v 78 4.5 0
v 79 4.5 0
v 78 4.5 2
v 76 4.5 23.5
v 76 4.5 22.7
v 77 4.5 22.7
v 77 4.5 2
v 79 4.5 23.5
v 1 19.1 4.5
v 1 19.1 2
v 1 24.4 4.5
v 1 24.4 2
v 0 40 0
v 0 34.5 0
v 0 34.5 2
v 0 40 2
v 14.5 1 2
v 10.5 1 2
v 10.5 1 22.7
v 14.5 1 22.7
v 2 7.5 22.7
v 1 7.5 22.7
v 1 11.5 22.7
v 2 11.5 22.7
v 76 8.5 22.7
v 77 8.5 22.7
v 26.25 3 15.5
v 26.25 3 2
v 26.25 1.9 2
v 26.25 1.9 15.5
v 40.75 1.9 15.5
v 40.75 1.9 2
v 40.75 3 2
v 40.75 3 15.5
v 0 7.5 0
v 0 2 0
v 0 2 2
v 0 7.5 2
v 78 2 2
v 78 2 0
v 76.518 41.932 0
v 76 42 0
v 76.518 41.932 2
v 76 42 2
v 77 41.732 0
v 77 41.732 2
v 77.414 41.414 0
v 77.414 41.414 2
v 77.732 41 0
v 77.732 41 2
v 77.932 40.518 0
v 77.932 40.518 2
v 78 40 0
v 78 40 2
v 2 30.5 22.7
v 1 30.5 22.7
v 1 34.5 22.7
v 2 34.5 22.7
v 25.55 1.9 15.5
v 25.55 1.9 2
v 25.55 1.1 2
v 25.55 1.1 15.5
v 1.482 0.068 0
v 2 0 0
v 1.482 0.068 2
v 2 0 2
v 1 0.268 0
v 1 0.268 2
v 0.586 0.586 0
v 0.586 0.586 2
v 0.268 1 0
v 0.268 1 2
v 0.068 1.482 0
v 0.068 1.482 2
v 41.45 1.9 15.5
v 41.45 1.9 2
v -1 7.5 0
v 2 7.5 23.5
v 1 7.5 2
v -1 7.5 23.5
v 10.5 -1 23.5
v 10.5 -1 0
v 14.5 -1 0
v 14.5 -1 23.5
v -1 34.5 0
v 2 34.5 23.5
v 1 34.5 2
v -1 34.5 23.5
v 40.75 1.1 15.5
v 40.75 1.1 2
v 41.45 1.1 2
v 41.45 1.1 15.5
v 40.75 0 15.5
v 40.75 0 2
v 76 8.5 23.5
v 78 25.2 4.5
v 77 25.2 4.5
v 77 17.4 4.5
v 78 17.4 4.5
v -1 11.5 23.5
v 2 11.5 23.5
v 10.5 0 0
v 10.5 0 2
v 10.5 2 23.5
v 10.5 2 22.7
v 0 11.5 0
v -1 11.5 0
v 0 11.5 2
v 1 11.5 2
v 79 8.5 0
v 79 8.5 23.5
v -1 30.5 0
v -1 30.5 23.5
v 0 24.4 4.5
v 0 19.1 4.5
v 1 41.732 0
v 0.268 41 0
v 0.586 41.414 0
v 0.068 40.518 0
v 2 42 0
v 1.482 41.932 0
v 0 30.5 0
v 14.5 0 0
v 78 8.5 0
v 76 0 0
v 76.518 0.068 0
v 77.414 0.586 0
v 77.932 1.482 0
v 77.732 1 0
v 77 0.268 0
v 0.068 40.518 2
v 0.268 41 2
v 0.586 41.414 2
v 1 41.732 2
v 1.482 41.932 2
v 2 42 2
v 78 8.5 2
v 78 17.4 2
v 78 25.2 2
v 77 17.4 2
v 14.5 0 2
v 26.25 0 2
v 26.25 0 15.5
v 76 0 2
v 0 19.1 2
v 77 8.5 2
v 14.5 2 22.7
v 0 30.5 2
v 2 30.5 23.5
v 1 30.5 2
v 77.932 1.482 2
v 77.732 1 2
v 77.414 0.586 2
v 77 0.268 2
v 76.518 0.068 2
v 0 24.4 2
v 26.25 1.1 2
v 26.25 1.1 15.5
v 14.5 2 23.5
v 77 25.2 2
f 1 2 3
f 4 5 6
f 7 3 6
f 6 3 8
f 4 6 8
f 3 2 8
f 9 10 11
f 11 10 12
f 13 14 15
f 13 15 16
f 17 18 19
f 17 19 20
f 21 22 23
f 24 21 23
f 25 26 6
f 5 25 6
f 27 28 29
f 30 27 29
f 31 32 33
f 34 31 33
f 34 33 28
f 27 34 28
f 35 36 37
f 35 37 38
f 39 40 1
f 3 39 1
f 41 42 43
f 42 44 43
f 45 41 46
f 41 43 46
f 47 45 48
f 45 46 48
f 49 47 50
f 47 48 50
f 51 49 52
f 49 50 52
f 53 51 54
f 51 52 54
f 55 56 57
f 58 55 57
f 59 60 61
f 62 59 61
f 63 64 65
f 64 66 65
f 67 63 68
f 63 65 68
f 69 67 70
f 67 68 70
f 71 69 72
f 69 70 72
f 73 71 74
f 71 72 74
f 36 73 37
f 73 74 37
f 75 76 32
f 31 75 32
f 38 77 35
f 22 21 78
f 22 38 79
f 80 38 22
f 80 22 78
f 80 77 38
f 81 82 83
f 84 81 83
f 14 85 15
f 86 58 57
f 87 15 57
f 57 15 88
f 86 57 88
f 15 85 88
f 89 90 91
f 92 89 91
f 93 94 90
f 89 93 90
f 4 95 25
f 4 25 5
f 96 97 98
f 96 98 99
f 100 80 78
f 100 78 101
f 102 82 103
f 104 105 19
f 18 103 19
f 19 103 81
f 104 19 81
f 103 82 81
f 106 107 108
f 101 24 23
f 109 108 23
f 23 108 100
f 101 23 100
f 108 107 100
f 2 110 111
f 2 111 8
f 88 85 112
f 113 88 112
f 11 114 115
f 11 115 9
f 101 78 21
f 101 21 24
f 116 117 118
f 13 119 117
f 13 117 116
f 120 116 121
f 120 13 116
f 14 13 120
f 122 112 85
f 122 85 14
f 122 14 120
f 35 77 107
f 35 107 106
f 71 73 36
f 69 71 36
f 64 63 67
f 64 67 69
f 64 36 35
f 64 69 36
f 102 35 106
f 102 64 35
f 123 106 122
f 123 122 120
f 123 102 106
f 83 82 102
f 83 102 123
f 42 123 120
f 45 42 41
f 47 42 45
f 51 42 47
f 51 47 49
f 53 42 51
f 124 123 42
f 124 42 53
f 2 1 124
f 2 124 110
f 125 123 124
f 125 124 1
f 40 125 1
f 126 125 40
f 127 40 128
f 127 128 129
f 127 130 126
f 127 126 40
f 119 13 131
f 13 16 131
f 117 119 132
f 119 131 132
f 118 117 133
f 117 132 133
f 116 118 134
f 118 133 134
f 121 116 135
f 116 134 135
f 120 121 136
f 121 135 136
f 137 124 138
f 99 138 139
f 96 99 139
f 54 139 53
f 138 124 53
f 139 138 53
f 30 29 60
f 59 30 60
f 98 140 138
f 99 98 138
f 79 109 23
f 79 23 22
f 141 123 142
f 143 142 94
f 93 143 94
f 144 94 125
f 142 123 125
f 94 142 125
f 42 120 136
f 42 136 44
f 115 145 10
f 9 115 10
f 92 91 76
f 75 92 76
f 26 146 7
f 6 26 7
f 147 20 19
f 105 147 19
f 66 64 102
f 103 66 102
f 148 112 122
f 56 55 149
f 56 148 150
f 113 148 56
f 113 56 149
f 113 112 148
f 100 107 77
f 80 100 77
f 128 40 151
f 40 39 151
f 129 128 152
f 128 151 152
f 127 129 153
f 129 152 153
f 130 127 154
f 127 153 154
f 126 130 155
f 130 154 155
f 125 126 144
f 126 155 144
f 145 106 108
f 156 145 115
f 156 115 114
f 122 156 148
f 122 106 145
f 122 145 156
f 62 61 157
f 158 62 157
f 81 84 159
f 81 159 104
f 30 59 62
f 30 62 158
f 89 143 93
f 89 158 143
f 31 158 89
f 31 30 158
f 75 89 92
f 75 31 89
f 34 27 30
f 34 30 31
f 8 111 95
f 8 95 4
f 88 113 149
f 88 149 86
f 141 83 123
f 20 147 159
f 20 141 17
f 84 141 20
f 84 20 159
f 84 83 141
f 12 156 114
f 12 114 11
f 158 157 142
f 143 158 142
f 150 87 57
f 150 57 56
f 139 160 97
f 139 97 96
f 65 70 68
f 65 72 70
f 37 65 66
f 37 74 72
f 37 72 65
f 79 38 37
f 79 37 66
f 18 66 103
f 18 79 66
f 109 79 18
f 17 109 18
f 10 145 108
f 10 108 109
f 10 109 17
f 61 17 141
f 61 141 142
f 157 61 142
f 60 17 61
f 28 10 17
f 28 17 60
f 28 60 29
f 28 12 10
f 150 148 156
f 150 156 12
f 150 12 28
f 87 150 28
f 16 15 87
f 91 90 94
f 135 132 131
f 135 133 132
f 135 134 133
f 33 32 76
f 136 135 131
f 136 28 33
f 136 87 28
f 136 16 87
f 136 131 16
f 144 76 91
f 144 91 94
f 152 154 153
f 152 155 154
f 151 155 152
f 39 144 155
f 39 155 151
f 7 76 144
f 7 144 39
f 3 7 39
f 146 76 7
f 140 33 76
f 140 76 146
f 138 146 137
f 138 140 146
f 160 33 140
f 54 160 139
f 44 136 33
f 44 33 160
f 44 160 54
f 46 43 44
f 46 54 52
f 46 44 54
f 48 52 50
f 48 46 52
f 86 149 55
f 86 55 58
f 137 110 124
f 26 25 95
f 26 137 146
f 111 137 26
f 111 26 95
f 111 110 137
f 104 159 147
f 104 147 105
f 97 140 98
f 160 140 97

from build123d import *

# Parameters (mm, degrees)
F0_W      = 78
F0_H      = 42
F1_DEPTH  = 2
F2_W      = 2
F2_H      = 4
F2_W_2    = 4
F2_H_2    = 2
F3_DEPTH  = 23.5
F5_DEPTH  = 13.5
F6_W      = 1
F6_H      = 5.3
F6_H_2    = 7.8
F7_DEPTH  = 2.5
F8_R      = 2
F9_W      = 4
F9_H      = 0.8
F10_DEPTH = 1
F11_W     = 4
F11_H     = 0.8
F12_DEPTH = 1
F13_W     = 4
F13_H     = 0.8
F14_DEPTH = 1
F15_W     = 4
F15_H     = 0.8
F16_DEPTH = 1


with BuildPart() as f1:
    # F0 (on Top) → F1 (new body)
    with BuildSketch(Plane.XY):
        with Locations((39, 21)):
            Rectangle(F0_W, F0_H)
    extrude(amount=F1_DEPTH)

    # F2 (on face) → F3 (join)
    with BuildSketch(Plane(origin=(0, 0, 0), x_dir=(1, 0, 0), z_dir=(0, 0, -1))):
        with Locations((0, -32.5)):
            Rectangle(F2_W, F2_H)
        with Locations((12.5, 0)):
            Rectangle(F2_W_2, F2_H_2)
        with Locations((78, -6.5)):
            Rectangle(F2_W, F2_H)
        with Locations((0, -9.5)):
            Rectangle(F2_W, F2_H)
    extrude(amount=-F3_DEPTH)

    # F4 (on face) → F5 (join)
    with BuildSketch(Plane.XY.offset(2)):
        Polygon((26.25, 0), (40.75, 0), (40.75, 1.1), (41.45, 1.1), (41.45, 1.9), (40.75, 1.9), (40.75, 3), (26.25, 3), (26.25, 1.9), (25.55, 1.9), (25.55, 1.1), (26.25, 1.1), align=None)
    extrude(amount=F5_DEPTH)

    # F6 (on face) → F7 (join)
    with BuildSketch(Plane.XY.offset(2)):
        with Locations((0.5, 21.75)):
            Rectangle(F6_W, F6_H)
        with Locations((77.5, 21.3)):
            Rectangle(F6_W, F6_H_2)
    extrude(amount=F7_DEPTH)

    # F8
    f8_edges = [f1.edges().sort_by_distance(p)[0] for p in [
        (78, 42, 1),
        (78, 0, 1),
        (0, 42, 1),
        (0, 0, 1),
    ]]
    fillet(f8_edges, radius=F8_R)

    # F9 (on face) → F10 (join)
    with BuildSketch(Plane(origin=(0, 1, 0), x_dir=(-1, 0, 0), z_dir=(0, 1, 0))):
        with Locations((-12.5, 23.1)):
            Rectangle(F9_W, F9_H)
    extrude(amount=F10_DEPTH)

    # F11 (on face) → F12 (join)
    with BuildSketch(Plane(origin=(77, 0, 0), x_dir=(0, -1, 0), z_dir=(-1, 0, 0))):
        with Locations((-6.5, 23.1)):
            Rectangle(F11_W, F11_H)
    extrude(amount=F12_DEPTH)

    # F13 (on face) → F14 (join)
    with BuildSketch(Plane.YZ.offset(1)):
        with Locations((32.5, 23.1)):
            Rectangle(F13_W, F13_H)
    extrude(amount=F14_DEPTH)

    # F15 (on face) → F16 (join)
    with BuildSketch(Plane.YZ.offset(1)):
        with Locations((9.5, 23.1)):
            Rectangle(F15_W, F15_H)
    extrude(amount=F16_DEPTH)


solid = f1.part
